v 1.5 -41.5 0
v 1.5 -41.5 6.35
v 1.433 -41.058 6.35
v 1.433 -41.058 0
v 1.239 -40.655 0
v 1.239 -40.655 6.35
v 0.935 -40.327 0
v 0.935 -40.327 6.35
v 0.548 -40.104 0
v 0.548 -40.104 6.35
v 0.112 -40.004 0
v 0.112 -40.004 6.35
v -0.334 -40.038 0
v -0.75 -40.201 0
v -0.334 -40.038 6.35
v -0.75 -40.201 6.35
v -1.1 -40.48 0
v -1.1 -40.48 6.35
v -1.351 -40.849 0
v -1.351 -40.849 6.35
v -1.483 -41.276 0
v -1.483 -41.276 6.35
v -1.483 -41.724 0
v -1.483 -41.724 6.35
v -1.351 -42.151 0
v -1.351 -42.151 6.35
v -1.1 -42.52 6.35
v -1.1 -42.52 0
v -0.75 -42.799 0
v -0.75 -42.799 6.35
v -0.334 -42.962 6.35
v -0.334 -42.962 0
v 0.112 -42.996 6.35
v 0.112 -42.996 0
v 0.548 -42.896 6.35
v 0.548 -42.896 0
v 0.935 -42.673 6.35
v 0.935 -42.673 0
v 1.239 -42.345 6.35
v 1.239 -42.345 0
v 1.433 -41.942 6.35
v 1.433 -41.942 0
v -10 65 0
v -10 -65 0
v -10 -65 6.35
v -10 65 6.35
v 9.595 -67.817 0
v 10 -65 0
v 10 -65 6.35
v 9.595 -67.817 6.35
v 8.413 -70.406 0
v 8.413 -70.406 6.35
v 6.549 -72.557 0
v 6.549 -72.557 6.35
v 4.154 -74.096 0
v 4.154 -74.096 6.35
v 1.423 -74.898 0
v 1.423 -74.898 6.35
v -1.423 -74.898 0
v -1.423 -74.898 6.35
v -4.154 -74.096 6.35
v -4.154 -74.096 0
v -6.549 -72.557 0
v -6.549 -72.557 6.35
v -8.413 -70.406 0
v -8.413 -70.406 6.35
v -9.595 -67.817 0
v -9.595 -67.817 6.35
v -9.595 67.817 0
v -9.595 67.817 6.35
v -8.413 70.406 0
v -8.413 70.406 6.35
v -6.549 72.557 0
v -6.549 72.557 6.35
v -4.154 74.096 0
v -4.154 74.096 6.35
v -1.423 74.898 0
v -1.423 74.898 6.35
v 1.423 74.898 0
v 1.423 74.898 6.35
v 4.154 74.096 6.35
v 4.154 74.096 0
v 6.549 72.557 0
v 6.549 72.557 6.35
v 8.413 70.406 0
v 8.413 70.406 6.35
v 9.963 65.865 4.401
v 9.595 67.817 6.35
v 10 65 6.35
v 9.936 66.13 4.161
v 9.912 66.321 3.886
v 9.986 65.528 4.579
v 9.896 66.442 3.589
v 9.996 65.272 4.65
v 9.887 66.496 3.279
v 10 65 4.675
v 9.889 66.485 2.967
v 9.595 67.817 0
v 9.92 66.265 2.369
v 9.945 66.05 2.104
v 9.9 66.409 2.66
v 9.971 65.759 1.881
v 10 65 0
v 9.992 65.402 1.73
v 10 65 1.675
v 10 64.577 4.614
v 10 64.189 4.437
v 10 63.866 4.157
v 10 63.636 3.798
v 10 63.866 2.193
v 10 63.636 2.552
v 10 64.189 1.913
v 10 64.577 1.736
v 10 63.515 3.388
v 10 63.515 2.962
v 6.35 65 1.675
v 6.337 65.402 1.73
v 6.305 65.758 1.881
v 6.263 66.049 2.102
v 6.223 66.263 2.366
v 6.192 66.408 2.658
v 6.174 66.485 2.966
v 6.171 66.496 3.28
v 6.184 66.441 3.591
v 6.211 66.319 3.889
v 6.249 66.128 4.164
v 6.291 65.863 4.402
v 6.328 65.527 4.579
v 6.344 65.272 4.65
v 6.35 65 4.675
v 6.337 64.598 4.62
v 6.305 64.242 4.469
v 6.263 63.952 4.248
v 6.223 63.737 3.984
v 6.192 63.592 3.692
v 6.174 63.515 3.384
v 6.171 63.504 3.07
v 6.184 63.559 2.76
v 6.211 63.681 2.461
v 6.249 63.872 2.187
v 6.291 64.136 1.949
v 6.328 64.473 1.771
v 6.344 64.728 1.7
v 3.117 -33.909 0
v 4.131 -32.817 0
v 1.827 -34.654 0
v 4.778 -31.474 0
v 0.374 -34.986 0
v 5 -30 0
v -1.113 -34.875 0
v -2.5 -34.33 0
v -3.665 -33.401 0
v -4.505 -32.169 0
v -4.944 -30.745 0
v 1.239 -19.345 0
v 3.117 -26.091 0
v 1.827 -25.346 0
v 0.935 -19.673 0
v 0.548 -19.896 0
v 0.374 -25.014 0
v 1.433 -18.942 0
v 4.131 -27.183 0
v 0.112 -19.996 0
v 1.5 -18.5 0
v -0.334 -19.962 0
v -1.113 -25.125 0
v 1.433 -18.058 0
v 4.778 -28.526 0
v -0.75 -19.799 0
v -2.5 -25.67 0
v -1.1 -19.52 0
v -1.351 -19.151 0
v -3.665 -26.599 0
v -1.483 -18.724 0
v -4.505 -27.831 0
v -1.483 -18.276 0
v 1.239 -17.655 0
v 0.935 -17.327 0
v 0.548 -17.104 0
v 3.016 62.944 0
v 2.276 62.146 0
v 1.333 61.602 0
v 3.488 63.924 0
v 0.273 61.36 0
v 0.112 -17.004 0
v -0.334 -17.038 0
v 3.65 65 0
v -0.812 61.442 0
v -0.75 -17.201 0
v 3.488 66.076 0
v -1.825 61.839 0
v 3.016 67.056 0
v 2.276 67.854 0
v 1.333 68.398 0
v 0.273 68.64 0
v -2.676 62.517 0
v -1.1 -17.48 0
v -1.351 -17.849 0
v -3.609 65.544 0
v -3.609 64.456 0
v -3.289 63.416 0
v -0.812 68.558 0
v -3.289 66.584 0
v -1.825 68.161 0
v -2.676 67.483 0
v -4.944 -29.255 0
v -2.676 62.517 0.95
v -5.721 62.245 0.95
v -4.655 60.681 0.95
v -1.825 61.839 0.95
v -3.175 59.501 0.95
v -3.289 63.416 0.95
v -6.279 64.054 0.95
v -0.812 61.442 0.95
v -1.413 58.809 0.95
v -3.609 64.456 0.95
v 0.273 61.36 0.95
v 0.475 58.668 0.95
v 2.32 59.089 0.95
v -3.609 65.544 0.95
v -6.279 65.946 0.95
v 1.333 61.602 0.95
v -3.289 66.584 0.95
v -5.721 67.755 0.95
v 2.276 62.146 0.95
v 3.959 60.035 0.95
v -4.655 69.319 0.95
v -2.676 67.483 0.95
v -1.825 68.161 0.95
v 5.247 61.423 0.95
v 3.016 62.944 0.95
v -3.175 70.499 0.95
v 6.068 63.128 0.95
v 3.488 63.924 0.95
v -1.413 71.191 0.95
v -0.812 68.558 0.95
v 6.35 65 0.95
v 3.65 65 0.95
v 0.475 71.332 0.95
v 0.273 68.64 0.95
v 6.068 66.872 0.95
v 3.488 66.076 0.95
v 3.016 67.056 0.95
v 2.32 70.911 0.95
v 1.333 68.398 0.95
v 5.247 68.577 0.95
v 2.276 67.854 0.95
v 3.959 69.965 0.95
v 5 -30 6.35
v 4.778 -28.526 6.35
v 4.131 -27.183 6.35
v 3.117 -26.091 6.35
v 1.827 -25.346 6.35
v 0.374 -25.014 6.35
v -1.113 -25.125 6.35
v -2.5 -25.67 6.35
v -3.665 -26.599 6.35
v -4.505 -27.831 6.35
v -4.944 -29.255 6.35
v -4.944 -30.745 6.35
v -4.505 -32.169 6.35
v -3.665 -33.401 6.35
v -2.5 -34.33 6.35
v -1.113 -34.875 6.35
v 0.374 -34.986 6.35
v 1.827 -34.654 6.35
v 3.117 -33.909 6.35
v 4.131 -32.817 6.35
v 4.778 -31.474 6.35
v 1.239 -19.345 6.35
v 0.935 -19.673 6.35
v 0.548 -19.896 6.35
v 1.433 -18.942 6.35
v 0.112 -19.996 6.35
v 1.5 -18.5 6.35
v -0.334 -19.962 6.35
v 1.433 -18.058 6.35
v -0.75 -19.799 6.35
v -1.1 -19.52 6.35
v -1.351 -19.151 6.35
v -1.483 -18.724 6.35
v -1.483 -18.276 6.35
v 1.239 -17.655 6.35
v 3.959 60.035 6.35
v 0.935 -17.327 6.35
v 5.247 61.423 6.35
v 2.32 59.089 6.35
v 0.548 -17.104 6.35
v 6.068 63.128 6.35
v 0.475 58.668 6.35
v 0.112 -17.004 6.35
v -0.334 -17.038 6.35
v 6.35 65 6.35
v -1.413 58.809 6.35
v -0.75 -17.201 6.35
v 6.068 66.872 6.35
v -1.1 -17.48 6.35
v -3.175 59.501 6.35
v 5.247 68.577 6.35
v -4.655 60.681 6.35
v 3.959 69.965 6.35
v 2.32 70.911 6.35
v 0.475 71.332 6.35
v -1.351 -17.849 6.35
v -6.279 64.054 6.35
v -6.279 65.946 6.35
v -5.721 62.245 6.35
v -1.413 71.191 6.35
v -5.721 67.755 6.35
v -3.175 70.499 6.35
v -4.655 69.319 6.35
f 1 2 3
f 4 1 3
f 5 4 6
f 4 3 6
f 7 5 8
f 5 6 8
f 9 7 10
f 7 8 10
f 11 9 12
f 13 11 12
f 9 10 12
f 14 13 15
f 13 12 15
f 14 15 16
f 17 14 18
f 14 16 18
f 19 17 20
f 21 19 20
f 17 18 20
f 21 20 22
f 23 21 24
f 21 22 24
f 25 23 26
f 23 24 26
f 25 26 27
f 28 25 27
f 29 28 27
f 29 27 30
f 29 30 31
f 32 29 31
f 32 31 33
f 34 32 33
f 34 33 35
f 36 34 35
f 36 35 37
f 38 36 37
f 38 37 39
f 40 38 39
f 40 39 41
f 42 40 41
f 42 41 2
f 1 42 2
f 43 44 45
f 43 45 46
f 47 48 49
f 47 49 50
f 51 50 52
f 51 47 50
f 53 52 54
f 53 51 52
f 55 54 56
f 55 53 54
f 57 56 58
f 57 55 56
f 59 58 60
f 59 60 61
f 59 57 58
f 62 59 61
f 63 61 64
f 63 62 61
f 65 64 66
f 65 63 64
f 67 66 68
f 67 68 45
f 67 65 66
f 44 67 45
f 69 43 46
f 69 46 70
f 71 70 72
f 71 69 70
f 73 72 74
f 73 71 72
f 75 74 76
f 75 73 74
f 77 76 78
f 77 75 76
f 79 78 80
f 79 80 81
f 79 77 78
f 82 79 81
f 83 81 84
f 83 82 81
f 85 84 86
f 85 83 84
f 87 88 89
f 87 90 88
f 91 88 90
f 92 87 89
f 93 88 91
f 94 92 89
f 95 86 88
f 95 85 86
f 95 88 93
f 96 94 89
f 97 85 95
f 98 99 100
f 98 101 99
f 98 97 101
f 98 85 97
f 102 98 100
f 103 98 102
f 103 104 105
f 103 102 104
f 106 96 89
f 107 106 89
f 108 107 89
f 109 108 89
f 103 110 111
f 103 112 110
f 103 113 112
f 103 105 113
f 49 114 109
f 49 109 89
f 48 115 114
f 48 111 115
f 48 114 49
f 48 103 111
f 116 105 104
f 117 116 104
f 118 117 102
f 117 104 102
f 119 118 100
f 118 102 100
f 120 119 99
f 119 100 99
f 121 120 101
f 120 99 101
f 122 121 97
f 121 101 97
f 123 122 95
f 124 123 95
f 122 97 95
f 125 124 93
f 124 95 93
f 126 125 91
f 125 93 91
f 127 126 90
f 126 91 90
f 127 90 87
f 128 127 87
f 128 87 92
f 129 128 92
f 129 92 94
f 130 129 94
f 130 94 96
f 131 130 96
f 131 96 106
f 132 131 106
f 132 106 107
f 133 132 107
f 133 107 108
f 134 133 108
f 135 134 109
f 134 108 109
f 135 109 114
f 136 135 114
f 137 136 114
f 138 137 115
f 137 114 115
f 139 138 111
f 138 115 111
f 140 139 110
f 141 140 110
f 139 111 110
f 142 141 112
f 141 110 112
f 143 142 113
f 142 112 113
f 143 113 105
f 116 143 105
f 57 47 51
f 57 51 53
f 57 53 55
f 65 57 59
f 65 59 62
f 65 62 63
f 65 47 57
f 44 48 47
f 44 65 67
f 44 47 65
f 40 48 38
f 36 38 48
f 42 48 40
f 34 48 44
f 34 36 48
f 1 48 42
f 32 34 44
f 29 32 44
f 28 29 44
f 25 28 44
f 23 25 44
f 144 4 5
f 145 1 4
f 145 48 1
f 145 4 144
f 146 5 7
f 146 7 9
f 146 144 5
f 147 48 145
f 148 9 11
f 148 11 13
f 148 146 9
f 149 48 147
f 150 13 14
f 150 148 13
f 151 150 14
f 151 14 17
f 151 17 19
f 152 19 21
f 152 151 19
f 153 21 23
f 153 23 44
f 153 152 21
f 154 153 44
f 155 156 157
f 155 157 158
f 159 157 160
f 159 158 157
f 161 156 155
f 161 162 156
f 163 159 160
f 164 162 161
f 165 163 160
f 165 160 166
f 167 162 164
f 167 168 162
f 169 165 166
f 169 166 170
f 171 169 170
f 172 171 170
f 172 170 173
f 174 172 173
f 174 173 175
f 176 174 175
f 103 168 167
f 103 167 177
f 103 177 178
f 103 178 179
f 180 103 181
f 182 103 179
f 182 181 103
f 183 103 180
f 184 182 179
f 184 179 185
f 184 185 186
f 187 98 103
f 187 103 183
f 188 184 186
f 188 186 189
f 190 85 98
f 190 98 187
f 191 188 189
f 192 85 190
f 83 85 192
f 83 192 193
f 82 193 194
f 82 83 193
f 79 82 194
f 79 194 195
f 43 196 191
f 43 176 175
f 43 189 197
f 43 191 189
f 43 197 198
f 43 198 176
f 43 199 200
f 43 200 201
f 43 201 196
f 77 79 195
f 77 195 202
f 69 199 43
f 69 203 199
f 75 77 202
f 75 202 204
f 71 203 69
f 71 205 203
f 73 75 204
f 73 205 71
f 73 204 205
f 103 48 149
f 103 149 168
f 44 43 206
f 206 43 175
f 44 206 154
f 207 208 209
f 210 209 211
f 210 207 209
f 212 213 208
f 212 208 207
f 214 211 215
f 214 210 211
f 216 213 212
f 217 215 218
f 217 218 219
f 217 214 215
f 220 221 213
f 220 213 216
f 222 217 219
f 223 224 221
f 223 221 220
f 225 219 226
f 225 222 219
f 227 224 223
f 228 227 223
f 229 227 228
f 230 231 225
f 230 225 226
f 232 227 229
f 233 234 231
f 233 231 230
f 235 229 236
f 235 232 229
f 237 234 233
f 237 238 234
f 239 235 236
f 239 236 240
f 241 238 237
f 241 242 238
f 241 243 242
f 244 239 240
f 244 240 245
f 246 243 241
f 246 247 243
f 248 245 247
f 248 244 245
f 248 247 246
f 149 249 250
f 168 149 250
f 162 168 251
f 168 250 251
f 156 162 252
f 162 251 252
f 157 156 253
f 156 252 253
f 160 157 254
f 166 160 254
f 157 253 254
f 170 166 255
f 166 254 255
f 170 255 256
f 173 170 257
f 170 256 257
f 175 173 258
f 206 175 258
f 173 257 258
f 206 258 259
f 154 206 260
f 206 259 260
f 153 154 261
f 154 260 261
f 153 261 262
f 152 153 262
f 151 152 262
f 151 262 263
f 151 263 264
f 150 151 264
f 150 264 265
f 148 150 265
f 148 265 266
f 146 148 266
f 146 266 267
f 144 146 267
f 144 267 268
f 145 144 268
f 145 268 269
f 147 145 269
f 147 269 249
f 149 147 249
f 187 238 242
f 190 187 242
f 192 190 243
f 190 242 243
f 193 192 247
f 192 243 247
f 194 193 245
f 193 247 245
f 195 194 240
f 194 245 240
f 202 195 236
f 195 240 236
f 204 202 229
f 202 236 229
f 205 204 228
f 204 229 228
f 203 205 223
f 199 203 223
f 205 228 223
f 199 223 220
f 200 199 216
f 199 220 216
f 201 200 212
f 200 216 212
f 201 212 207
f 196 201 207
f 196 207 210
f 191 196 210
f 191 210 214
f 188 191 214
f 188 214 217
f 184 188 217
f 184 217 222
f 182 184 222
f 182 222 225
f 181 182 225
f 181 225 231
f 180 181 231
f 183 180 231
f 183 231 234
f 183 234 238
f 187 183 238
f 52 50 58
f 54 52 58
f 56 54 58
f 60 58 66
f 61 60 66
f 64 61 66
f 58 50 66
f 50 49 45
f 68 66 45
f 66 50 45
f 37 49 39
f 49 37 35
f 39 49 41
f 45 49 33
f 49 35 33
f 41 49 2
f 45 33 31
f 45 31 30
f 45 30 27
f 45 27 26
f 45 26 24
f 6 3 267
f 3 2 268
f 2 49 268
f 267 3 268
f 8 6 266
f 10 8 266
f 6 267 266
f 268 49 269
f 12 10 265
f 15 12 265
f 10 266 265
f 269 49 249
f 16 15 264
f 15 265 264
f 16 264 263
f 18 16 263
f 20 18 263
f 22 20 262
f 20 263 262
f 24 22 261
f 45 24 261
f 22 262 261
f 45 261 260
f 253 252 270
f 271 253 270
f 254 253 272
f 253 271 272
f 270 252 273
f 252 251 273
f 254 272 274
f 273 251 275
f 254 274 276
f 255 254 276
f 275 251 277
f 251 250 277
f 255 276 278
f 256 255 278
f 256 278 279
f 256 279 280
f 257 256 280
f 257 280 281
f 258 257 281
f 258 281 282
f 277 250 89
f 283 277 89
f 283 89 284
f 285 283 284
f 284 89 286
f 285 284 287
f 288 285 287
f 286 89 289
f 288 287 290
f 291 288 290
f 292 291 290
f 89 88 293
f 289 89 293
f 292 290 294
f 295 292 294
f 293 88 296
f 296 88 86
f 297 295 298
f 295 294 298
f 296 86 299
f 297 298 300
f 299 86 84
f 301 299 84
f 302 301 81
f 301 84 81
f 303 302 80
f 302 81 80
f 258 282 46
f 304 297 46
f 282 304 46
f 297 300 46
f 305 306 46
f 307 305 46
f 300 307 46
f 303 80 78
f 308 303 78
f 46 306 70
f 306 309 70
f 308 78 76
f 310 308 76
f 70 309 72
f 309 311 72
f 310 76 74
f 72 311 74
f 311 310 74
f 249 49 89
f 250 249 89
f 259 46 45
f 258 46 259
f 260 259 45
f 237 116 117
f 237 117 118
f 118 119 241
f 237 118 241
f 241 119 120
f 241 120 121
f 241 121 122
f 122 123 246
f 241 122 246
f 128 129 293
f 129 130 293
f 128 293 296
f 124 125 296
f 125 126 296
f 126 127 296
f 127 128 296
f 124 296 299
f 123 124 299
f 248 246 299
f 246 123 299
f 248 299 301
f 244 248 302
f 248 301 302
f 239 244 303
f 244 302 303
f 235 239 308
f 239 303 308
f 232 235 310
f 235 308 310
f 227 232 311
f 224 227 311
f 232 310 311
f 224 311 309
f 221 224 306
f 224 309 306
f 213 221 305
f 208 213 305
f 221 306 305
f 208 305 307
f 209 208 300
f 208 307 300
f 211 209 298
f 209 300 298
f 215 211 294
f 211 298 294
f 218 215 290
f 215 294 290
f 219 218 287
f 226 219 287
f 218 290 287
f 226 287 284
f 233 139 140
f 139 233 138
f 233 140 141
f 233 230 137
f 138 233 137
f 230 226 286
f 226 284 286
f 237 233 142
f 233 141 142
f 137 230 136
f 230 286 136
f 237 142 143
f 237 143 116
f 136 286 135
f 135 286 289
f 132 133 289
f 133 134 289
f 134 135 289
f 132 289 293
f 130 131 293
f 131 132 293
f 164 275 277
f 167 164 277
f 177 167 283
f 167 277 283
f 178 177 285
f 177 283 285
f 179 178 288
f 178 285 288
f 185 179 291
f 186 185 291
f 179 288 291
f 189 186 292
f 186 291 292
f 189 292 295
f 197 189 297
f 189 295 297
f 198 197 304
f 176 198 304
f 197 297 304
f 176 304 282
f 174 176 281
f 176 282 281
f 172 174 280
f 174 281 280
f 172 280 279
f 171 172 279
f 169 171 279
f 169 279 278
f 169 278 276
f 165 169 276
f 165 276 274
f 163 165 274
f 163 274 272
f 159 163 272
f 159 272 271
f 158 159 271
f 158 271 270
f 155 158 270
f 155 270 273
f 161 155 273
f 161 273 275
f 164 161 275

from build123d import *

# Parameters (mm, degrees)
SALIENTE_EXTRUIR1_DEPTH = 6.35
CROQUIS2_R              = 6.35
CORTAR_EXTRUIR1_DEPTH   = 5.4
CROQUIS3_R              = 3.65
CORTAR_EXTRUIR2_DEPTH   = 5.4
CROQUIS4_R              = 5
CROQUIS4_R_2            = 1.5
CORTAR_EXTRUIR3_DEPTH   = 7.35
CROQUIS5_R              = 1.5
CORTAR_EXTRUIR4_DEPTH   = 10


with BuildPart() as part:
    # Croquis1 → Saliente-Extruir1 (new body)
    with BuildSketch(Plane.XY):
        with BuildLine():
            Line((10, 65), (10, -65))
            ThreePointArc((10, -65), (0, -75), (-10, -65))
            Line((-10, -65), (-10, 65))
            ThreePointArc((-10, 65), (0, 75), (10, 65))
        make_face()
    extrude(amount=SALIENTE_EXTRUIR1_DEPTH)

    # Croquis2 → Cortar-Extruir1 (cut)
    with BuildSketch(Plane.XY.offset(6.35)):
        with Locations((0, 65)):
            Circle(CROQUIS2_R)
    extrude(amount=-CORTAR_EXTRUIR1_DEPTH, mode=Mode.SUBTRACT)

    # Croquis3 → Cortar-Extruir2 (cut)
    with BuildSketch(Plane.XY.offset(0.95)):
        with Locations((0, 65)):
            Circle(CROQUIS3_R)
    extrude(amount=-CORTAR_EXTRUIR2_DEPTH, mode=Mode.SUBTRACT)

    # Croquis4 → Cortar-Extruir3 (cut, through all)
    with BuildSketch(Plane.XY.offset(6.35)):
        with Locations((0, -30)):
            Circle(CROQUIS4_R)
        with Locations((0, -18.5)):
            Circle(CROQUIS4_R_2)
        with Locations((0, -41.5)):
            Circle(CROQUIS4_R_2)
    extrude(amount=-CORTAR_EXTRUIR3_DEPTH, mode=Mode.SUBTRACT)

    # Croquis5 → Cortar-Extruir4 (cut)
    with BuildSketch(Plane(origin=(10, 0, 0), x_dir=(0, 0, -1), z_dir=(1, 0, 0))):
        with Locations((-3.175, 65)):
            Circle(CROQUIS5_R)
    extrude(amount=-CORTAR_EXTRUIR4_DEPTH, mode=Mode.SUBTRACT)


solid = part.part
